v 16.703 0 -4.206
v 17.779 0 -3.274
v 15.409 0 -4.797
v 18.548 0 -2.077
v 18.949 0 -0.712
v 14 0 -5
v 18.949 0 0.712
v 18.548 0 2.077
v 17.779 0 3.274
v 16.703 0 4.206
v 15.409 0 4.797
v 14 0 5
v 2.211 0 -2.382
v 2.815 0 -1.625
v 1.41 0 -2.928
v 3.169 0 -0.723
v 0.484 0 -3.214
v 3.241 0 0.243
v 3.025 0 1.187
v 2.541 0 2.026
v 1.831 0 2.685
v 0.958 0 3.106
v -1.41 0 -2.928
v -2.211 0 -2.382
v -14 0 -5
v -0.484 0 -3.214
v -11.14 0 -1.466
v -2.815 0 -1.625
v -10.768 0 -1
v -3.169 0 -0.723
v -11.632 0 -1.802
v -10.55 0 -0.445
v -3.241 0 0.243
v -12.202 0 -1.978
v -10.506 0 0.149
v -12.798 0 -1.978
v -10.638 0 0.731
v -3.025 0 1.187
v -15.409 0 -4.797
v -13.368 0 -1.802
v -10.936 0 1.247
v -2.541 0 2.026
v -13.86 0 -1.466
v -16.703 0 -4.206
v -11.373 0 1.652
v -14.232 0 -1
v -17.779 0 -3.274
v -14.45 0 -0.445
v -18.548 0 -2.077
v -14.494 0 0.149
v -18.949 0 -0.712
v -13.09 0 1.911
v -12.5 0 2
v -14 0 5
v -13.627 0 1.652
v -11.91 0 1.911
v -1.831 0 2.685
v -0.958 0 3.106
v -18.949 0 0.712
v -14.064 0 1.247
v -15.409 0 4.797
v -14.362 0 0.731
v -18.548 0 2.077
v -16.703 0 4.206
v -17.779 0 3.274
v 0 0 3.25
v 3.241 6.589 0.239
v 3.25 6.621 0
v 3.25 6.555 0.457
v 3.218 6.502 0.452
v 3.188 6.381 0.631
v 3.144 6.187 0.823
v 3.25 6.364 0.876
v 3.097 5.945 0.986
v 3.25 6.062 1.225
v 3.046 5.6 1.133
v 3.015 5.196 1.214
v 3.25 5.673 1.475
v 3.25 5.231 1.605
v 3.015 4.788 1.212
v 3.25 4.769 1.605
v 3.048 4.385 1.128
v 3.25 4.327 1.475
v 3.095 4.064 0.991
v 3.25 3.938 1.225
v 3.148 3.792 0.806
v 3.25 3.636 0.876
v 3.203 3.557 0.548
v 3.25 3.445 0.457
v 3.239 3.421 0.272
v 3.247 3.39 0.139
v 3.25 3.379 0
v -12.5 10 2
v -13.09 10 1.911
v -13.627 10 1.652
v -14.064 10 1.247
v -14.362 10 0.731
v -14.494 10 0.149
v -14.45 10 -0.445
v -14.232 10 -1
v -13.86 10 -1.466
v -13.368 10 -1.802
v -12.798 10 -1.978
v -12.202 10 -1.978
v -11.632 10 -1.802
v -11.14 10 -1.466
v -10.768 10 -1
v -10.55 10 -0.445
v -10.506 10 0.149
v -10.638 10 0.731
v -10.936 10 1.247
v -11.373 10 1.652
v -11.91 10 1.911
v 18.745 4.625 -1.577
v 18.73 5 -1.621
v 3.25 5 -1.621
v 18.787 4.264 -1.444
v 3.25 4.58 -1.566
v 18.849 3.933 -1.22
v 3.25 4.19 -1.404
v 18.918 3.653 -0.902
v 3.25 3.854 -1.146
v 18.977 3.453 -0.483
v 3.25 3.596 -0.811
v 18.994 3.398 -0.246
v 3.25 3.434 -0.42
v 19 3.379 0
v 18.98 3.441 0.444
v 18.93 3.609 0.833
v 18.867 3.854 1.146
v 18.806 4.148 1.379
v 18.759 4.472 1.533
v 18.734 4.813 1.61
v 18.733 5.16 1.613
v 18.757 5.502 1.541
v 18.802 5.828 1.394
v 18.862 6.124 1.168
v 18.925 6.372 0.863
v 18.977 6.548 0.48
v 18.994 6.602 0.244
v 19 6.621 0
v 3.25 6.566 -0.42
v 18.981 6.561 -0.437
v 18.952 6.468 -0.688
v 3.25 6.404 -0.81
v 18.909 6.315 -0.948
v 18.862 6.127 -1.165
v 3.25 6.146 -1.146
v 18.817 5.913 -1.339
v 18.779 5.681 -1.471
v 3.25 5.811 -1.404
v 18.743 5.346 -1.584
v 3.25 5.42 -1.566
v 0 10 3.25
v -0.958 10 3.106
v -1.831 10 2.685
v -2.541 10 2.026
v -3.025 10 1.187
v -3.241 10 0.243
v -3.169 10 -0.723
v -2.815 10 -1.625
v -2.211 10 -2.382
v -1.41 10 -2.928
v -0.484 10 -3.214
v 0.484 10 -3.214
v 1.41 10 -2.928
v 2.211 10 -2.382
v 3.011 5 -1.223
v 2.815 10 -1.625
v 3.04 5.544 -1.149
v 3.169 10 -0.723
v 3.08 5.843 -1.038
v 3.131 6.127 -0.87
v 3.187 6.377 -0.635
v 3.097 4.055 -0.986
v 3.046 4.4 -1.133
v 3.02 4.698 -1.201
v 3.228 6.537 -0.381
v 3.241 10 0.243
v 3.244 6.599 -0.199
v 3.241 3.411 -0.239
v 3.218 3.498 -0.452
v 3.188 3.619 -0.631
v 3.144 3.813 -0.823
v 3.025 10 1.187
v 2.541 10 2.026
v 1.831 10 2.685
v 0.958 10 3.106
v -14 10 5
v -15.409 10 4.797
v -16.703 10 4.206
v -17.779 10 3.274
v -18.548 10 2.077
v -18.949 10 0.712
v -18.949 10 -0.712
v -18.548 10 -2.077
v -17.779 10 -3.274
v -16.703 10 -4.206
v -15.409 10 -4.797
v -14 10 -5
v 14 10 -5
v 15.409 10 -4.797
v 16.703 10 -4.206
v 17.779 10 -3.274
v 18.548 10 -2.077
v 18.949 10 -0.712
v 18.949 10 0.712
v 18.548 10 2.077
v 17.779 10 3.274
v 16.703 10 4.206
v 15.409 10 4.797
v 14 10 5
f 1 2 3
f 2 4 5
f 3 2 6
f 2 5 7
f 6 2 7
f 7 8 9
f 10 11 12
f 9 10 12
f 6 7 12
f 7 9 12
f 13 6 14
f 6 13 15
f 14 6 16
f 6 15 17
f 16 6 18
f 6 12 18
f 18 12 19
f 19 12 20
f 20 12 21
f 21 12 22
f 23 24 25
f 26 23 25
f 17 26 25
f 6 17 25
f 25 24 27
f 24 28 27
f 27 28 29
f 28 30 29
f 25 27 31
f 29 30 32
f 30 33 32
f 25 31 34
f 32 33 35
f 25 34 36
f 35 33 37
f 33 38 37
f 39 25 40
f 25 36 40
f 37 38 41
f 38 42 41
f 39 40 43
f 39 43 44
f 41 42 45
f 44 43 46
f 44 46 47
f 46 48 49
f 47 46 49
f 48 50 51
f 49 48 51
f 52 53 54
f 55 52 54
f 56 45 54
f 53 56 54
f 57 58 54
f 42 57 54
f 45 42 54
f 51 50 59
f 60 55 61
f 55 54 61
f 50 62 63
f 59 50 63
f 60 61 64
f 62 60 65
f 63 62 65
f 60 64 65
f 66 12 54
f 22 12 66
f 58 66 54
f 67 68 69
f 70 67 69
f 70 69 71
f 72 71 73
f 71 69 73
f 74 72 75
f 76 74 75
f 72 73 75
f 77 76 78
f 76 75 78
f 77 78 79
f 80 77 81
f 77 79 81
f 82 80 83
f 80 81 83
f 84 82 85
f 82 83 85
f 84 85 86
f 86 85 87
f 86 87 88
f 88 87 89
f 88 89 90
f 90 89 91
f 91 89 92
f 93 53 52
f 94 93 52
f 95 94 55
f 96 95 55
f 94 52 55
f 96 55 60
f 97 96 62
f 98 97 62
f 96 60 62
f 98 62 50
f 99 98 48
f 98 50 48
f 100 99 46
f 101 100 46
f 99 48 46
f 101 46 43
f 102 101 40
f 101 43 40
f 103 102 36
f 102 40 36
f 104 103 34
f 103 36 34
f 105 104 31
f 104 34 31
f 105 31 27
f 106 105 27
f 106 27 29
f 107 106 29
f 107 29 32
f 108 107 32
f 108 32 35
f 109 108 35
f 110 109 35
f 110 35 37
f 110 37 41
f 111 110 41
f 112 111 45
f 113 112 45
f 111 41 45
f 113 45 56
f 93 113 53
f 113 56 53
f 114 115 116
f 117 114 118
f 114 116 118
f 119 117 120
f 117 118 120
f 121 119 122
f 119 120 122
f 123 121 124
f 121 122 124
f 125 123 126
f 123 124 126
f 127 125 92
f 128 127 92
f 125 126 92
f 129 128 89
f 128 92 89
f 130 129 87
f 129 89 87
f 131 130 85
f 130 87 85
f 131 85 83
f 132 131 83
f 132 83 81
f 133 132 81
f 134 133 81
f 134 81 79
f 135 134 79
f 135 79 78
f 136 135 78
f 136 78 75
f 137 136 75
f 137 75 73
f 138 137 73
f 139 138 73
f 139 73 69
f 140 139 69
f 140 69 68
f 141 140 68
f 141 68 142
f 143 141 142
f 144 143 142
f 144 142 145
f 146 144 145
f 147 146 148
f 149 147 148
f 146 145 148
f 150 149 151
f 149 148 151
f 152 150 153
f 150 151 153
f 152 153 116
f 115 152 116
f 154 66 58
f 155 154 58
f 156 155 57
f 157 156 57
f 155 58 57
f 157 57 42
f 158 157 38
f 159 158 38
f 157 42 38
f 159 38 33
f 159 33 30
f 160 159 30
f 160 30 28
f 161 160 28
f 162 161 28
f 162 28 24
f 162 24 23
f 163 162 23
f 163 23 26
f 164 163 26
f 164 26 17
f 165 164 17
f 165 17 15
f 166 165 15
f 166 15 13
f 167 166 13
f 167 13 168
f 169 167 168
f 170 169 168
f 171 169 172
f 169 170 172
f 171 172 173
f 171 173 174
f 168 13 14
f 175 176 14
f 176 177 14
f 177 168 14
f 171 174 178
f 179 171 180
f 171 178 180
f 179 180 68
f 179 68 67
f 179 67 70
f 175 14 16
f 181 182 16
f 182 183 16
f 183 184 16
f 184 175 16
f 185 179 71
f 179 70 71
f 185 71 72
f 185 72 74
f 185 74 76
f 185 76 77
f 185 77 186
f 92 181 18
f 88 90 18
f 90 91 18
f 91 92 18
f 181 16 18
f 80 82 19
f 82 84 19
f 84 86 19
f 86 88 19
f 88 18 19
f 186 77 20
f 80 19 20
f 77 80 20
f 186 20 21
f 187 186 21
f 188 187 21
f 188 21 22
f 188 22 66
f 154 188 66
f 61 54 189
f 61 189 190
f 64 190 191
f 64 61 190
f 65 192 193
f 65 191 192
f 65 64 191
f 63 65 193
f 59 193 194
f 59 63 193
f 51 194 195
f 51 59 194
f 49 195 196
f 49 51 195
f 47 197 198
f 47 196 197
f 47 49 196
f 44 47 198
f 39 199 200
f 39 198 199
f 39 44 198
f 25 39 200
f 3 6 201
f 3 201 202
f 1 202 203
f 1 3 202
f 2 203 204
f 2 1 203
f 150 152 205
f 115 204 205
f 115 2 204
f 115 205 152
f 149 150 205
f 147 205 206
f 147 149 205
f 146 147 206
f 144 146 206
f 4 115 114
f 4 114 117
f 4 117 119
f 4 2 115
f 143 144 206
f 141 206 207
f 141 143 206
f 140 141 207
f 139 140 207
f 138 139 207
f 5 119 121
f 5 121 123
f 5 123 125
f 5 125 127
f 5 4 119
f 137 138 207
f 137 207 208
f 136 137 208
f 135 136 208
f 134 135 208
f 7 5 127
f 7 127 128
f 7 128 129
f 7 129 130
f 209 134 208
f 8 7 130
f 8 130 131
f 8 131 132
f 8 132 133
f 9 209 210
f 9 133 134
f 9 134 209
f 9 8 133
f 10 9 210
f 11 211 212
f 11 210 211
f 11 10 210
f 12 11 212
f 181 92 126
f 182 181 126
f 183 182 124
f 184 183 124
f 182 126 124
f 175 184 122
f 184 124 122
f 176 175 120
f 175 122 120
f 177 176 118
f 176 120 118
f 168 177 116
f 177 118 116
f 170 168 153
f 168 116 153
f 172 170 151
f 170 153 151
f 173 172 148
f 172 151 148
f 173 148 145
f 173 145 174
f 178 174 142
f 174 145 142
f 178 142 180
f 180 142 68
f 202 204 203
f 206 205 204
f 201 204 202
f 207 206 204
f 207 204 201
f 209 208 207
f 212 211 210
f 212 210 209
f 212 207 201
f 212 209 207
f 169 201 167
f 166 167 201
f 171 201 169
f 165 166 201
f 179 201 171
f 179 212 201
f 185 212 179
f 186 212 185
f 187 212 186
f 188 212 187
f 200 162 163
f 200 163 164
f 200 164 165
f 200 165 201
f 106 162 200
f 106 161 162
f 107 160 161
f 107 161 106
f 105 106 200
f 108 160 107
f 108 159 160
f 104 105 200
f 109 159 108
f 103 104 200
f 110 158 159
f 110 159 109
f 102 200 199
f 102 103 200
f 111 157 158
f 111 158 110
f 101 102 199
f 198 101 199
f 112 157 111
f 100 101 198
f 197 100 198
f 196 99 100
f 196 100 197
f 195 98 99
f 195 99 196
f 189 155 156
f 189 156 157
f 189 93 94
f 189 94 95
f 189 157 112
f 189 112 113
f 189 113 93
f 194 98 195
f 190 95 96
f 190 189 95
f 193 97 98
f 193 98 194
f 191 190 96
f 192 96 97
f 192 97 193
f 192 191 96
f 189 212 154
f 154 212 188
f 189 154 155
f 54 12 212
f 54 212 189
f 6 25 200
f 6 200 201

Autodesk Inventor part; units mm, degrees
ref_plane "XZ Plane" through (0, 0, 0) normal (0, 1, 0) x (-1, 0, 0)
ref_plane "XY Plane" through (0, 0, 0) normal (0, 0, 1) x (1, 0, 0)
sketch "Skizze1" plane through (0, 0, 0) normal (0, 1, 0) x (-1, 0, 0)
  line L0 (14, 0) -> (-14, 0) construction
  line L1 (14, -5) -> (-14, -5)
  line L2 (-14, 5) -> (14, 5)
  arc A0 (14, -5) -> (14, 5) centre (14, 0) ccw
  arc A1 (-14, 5) -> (-14, -5) centre (-14, 0) ccw
  point P0 (0, 0)
  point P1 (0, 0)
  point P2 (-19, 0)
  point P3 (19, 0)
  dimension "d1" = 38
  dimension "d2" = 5
extrude "Extrusion1" add sketch "Skizze1" along normal blind 10
sketch "Skizze2" plane through (0, 10, 0) normal (0, 1, 0) x (1, 0, 0)
  point P0 (0, 0)
  point P1 (0, 0)
hole "Bohrung1" at (0, 10, 0) direction (0, -1, 0) diameter 6.5 depth 10
sketch "Skizze3" plane through (0, 10, 0) normal (0, 1, 0) x (1, 0, 0)
  point P0 (0, 0)
  point P1 (-12.5, 0)
  dimension "d19" = 12.5
hole "Bohrung2" at (-12.5, 10, 0) direction (0, -1, 0) diameter 4 end through all
ref_plane "Arbeitsebene1" through (19, 0, 0) normal (1, 0, 0) x (0, 1, 0)
sketch "Skizze4" plane through (19, 0, 0) normal (1, 0, 0) x (0, 1, 0)
  line L0 (0, -5) -> (0, 5) projected
  point P0 (0, 0)
  point P1 (5, 0)
  point P2 (0, 0)
  dimension "d21" = 5
hole "Bohrung3" at (19, 5, 0) direction (-1, 0, 0) diameter 3.242 depth 15.75 tip angle 118 thread size "M4x0.7" class "6H" standard "ISO Metric profile"
properties part number "BMS_small" material "Gummi"
